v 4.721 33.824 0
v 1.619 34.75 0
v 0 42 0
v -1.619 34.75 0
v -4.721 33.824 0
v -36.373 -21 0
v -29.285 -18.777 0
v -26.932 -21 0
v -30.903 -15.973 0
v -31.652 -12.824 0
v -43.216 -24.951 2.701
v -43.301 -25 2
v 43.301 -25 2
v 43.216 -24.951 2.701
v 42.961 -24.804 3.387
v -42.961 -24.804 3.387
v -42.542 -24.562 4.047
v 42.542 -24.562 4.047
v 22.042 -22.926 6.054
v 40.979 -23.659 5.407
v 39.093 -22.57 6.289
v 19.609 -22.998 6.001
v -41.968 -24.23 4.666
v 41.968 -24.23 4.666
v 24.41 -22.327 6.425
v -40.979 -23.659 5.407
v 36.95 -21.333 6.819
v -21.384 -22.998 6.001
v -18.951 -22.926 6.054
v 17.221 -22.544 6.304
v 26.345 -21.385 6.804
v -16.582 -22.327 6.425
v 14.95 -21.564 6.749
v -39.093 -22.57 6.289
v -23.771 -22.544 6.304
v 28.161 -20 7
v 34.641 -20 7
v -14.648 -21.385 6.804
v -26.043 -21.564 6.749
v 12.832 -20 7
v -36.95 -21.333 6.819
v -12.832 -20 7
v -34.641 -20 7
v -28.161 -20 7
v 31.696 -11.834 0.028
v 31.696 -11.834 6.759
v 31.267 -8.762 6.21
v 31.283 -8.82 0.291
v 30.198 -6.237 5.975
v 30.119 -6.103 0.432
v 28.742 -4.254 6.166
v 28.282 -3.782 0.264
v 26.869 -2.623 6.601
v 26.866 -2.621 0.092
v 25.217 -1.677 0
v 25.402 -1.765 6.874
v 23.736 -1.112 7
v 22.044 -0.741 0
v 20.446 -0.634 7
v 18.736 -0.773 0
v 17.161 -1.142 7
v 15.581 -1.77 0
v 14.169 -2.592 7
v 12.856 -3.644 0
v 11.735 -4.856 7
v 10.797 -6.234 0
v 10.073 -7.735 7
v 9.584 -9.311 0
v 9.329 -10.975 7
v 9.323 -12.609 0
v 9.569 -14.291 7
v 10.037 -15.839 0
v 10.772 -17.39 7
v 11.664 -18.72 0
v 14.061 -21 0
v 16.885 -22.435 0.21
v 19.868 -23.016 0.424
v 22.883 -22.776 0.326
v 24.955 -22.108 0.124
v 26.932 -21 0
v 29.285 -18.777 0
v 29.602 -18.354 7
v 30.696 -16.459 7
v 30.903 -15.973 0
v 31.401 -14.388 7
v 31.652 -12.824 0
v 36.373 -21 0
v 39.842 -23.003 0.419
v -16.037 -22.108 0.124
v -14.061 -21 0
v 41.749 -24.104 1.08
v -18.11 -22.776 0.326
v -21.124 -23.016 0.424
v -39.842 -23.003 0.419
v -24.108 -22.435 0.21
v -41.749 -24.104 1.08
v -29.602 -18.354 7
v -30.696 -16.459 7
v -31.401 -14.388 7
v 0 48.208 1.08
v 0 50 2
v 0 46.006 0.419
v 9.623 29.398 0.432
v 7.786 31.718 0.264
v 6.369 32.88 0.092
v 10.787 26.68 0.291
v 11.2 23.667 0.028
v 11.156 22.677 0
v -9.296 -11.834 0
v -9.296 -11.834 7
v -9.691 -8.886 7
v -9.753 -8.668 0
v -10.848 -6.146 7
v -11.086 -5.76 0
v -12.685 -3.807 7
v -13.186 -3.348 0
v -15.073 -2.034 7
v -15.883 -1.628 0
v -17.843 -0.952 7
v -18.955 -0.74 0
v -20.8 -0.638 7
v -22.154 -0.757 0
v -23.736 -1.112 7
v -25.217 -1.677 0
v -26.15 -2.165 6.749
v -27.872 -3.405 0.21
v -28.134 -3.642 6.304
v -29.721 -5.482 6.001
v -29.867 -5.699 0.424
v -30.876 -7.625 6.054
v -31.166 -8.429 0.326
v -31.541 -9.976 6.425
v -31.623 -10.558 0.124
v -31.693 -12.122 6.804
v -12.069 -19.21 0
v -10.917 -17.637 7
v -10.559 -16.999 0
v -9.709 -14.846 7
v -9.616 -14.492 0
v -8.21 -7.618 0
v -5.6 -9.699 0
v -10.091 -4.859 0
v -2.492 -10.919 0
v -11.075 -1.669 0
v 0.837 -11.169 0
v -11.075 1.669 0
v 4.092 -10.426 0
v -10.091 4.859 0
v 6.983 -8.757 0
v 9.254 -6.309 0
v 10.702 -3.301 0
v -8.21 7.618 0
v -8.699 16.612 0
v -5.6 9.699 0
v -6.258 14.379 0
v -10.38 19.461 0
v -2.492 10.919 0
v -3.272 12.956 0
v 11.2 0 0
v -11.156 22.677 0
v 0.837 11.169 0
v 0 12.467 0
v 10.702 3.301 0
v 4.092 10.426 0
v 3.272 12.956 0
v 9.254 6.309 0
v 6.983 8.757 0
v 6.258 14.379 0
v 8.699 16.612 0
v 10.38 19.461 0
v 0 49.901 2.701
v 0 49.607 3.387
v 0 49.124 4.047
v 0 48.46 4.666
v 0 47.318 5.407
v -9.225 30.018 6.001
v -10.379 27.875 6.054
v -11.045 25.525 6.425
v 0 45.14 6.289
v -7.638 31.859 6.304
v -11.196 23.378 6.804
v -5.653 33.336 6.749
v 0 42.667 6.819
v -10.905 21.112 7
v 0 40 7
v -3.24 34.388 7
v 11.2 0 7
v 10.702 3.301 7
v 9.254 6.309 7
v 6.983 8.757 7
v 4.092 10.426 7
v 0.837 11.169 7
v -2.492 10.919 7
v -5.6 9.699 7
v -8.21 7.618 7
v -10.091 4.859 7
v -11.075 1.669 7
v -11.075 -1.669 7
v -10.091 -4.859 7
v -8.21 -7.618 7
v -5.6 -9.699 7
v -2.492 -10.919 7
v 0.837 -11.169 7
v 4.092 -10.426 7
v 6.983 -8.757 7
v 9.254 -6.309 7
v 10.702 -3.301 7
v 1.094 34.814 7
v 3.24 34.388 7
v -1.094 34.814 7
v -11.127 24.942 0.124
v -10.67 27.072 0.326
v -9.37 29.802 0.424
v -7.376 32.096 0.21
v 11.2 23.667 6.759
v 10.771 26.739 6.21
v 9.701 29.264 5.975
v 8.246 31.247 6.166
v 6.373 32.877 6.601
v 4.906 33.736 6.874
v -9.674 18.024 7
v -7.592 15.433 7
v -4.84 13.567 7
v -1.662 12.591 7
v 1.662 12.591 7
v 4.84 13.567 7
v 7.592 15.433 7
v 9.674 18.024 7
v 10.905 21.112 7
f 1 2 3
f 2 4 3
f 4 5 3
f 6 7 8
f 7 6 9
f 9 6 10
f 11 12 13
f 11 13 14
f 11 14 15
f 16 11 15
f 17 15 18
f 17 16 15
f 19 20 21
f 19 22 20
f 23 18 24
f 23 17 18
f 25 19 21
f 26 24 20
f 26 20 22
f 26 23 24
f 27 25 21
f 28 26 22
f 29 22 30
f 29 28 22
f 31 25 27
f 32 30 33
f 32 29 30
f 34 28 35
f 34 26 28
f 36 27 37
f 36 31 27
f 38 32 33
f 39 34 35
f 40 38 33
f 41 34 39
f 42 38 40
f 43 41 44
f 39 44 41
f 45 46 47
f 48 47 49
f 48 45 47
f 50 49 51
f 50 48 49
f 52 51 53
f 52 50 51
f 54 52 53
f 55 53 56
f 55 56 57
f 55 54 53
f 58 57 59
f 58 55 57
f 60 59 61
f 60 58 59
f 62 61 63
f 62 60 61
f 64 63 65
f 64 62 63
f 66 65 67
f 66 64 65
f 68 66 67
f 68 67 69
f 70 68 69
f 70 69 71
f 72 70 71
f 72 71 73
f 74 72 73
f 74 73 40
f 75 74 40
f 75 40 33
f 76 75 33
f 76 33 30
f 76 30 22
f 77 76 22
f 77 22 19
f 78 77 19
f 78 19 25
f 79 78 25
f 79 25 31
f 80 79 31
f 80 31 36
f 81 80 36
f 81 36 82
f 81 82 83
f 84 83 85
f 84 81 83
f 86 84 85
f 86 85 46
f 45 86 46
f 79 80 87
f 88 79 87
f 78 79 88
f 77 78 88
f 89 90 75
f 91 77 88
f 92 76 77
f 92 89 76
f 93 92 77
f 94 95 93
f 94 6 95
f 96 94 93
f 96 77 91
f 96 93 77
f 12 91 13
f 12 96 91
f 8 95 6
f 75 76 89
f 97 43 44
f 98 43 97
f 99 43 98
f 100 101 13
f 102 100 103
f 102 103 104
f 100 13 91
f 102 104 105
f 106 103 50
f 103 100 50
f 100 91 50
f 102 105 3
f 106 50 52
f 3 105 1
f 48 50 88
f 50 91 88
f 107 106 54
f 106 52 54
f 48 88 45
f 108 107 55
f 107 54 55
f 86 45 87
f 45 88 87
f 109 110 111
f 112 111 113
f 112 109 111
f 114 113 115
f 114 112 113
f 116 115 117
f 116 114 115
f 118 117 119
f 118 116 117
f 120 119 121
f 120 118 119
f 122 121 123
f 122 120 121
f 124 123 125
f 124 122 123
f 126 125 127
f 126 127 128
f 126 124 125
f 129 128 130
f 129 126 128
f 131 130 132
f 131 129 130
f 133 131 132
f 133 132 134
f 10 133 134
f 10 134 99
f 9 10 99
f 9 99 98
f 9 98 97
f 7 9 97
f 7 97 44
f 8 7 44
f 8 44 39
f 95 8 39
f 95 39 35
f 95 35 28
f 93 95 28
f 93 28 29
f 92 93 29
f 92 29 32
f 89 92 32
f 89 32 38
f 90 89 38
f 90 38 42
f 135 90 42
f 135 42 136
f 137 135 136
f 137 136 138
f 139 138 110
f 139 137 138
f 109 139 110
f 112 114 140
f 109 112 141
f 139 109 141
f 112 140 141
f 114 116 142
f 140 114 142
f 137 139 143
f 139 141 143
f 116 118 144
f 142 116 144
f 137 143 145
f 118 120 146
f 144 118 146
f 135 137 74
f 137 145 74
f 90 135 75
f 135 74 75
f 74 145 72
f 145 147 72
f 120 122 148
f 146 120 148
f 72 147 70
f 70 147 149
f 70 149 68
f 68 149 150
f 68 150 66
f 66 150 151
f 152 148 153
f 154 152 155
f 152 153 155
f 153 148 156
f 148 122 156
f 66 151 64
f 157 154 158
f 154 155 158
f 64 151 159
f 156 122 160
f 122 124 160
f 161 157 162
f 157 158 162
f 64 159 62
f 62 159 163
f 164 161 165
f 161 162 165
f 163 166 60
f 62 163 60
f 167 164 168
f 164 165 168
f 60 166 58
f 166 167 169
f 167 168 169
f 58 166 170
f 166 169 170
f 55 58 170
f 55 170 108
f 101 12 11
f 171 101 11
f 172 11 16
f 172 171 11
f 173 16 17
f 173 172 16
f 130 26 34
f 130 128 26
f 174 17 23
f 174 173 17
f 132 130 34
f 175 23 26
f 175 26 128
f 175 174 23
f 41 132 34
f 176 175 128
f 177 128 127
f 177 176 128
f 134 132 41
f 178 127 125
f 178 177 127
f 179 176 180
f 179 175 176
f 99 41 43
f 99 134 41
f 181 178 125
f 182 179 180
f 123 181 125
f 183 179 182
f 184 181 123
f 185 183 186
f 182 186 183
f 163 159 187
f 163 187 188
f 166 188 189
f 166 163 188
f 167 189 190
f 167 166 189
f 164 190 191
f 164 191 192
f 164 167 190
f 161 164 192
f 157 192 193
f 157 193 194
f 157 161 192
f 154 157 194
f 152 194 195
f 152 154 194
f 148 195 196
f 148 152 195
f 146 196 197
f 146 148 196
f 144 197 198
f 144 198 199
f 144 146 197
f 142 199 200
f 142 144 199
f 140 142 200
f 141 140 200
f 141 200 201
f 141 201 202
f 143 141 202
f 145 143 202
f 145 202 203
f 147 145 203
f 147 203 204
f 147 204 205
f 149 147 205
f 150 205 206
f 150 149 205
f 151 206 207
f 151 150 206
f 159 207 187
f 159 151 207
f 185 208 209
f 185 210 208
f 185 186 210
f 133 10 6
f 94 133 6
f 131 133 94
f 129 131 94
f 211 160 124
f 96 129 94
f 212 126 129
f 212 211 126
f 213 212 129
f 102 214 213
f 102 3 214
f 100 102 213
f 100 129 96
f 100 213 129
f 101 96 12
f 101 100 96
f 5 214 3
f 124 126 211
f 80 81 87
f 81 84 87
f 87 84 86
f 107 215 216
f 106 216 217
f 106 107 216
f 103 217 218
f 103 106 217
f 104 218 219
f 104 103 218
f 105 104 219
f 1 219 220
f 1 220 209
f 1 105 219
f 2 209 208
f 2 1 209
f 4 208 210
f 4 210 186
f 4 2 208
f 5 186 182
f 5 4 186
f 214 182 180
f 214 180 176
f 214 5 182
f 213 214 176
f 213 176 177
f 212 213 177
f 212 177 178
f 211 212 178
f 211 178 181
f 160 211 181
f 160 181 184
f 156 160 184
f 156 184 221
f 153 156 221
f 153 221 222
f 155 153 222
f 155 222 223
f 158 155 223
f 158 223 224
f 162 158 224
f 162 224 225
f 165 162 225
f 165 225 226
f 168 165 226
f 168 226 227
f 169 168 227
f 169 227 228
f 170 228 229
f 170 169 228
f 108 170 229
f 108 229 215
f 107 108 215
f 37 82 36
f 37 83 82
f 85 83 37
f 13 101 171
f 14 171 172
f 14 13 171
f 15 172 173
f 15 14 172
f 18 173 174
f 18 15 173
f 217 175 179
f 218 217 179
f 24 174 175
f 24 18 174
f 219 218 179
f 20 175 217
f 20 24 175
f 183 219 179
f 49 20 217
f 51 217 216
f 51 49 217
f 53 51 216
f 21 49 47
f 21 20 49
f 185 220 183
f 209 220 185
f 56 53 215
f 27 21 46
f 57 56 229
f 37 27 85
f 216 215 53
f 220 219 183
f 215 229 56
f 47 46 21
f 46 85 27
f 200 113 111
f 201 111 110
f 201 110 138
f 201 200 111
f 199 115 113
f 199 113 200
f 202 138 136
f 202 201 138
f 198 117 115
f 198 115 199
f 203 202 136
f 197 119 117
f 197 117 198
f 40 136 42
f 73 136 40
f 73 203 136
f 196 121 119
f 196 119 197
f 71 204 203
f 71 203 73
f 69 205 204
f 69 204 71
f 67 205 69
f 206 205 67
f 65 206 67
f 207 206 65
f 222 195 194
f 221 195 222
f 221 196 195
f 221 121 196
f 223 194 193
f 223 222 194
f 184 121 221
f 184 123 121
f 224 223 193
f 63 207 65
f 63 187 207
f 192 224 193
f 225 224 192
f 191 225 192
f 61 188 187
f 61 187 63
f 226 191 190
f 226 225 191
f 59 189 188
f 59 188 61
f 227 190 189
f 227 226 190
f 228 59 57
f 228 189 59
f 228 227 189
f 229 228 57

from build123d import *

# Parameters (mm, degrees)
F0_R        = 11.2
F1_DEPTH    = 7
F2_T1_DEPTH = 111.6025403784
F2_T3_DEPTH = 111.6025403784
F2_T5_DEPTH = 111.6025403784
F3_T1_DEPTH = 106.6025403784
F3_T3_DEPTH = 106.6025403784
F3_T5_DEPTH = 106.6025403784


# Not quite as in the source:
# - a fillet or chamfer that OpenCascade refuses, or shapes differently, is made with other operations: its cross-section is extruded or revolved along the edge and cut away or added


with BuildPart() as f1:
    # F0 (on Top) → F1 (new body)
    with BuildSketch(Plane.XY):
        Polygon((43.3012701892, -25), (0, 50), (-43.3012701892, -25), align=None)
        with Locations((-20.4962927973, -11.8335401639)):
            Circle(F0_R, mode=Mode.SUBTRACT)
        with Locations((20.4962927973, -11.8335401639)):
            Circle(F0_R, mode=Mode.SUBTRACT)
        Circle(F0_R, mode=Mode.SUBTRACT)
        with Locations((0, 23.6670803279)):
            Circle(F0_R, mode=Mode.SUBTRACT)
    extrude(amount=F1_DEPTH)

    # F2: fillet of radius 5 on 3 edges, made by hand

    # F2_s2 → F2_t1 (cut)
    with BuildSketch(Plane(origin=(27.9006350946, 48.3253175473, 0), x_dir=(0, 0, 1), z_dir=(-0.5, -0.8660254038, 0))):
        with BuildLine():
            ThreePointArc((2, 25), (5.5355339059, 23.5355339059), (7, 20))
            Line((7, 20), (7, 25))
            Line((7, 25), (2, 25))
        make_face()
    extrude(amount=F2_T1_DEPTH, mode=Mode.SUBTRACT)

    # F2_s4 → F2_t3 (cut)
    with BuildSketch(Plane.YZ.offset(-55.8012701892)):
        with BuildLine():
            ThreePointArc((-25, 2), (-23.5355339059, 5.5355339059), (-20, 7))
            Line((-20, 7), (-25, 7))
            Line((-25, 7), (-25, 2))
        make_face()
    extrude(amount=F2_T3_DEPTH, mode=Mode.SUBTRACT)

    # F2_s6 → F2_t5 (cut)
    with BuildSketch(Plane(origin=(27.9006350946, -48.3253175473, 0), x_dir=(0, 0, 1), z_dir=(-0.5, 0.8660254038, 0))):
        with BuildLine():
            ThreePointArc((2, 25), (5.5355339059, 23.5355339059), (7, 20))
            Line((7, 20), (7, 25))
            Line((7, 25), (2, 25))
        make_face()
    extrude(amount=F2_T5_DEPTH, mode=Mode.SUBTRACT)

    # F3: fillet of radius 5 on 3 edges, made by hand

    # F3_s2 → F3_t1 (cut)
    with BuildSketch(Plane(origin=(26.6506350946, -46.1602540378, 0), x_dir=(0, 0, 1), z_dir=(-0.5, 0.8660254038, 0))):
        with BuildLine():
            ThreePointArc((2, 25), (0.527864045, 23.2360679775), (0, 21))
            Line((0, 21), (0, 25))
            Line((0, 25), (2, 25))
        make_face()
    extrude(amount=F3_T1_DEPTH, mode=Mode.SUBTRACT)

    # F3_s4 → F3_t3 (cut)
    with BuildSketch(Plane.YZ.offset(-53.3012701892)):
        with BuildLine():
            ThreePointArc((-21, 0), (-23.2360679775, 0.527864045), (-25, 2))
            Line((-25, 2), (-25, 0))
            Line((-25, 0), (-21, 0))
        make_face()
    extrude(amount=F3_T3_DEPTH, mode=Mode.SUBTRACT)

    # F3_s6 → F3_t5 (cut)
    with BuildSketch(Plane(origin=(26.6506350946, 46.1602540378, 0), x_dir=(0, 0, 1), z_dir=(-0.5, -0.8660254038, 0))):
        with BuildLine():
            ThreePointArc((0, 21), (0.527864045, 23.2360679775), (2, 25))
            Line((2, 25), (0, 25))
            Line((0, 25), (0, 21))
        make_face()
    extrude(amount=F3_T5_DEPTH, mode=Mode.SUBTRACT)


solid = f1.part
